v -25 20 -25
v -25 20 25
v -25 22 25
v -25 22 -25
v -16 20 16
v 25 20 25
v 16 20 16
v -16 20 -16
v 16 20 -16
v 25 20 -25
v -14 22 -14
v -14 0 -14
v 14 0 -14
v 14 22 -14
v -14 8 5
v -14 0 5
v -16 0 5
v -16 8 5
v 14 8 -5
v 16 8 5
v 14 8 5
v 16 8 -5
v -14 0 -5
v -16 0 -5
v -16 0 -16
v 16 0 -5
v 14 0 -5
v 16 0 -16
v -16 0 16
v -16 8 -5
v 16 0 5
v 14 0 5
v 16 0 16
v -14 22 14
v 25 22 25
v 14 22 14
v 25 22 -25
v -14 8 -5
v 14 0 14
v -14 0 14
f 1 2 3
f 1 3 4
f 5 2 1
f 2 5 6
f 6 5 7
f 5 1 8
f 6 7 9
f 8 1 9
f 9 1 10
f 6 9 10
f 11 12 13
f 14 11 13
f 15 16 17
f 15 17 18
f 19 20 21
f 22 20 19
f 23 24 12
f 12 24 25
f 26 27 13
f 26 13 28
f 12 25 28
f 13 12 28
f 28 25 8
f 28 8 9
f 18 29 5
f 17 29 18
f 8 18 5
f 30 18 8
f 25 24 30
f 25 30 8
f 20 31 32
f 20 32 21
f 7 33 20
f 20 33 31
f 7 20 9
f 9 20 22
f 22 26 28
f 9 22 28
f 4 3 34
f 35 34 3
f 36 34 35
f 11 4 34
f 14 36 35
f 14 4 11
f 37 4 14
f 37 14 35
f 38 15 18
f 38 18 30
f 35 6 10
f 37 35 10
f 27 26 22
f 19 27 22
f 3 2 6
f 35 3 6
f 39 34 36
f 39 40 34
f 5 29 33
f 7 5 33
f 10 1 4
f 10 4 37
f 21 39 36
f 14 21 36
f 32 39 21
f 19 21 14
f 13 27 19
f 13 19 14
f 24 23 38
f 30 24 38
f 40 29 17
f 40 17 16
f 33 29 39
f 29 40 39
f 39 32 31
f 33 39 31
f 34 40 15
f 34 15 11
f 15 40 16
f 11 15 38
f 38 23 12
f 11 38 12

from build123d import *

# Parameters (mm, degrees)
SKETCH1_W           = 32
SKETCH1_H           = 32
SKETCH1_W_2         = 28
SKETCH1_H_2         = 28
BOSS_EXTRUDE1_DEPTH = 20
SKETCH2_W           = 10
SKETCH2_H           = 8
CUT_EXTRUDE1_DEPTH  = 33
SKETCH3_W           = 50
SKETCH3_H           = 50
SKETCH3_W_2         = 28
SKETCH3_H_2         = 28
BOSS_EXTRUDE2_DEPTH = 2


with BuildPart() as part:
    # Sketch1 → Boss-Extrude1 (new body)
    with BuildSketch(Plane(origin=(0, 0, 0), x_dir=(1, 0, 0), z_dir=(0, 1, 0))):
        Rectangle(SKETCH1_W, SKETCH1_H)
        Rectangle(SKETCH1_W_2, SKETCH1_H_2, mode=Mode.SUBTRACT)
    extrude(amount=BOSS_EXTRUDE1_DEPTH)

    # Sketch2 → Cut-Extrude1 (cut, through all)
    with BuildSketch(Plane(origin=(16, 0, 0), x_dir=(0, 0, -1), z_dir=(1, 0, 0))):
        with Locations((0, 4)):
            Rectangle(SKETCH2_W, SKETCH2_H)
    extrude(amount=-CUT_EXTRUDE1_DEPTH, mode=Mode.SUBTRACT)

    # Sketch3 → Boss-Extrude2 (add)
    with BuildSketch(Plane(origin=(0, 20, 0), x_dir=(1, 0, 0), z_dir=(0, 1, 0))):
        Rectangle(SKETCH3_W, SKETCH3_H)
        Rectangle(SKETCH3_W_2, SKETCH3_H_2, mode=Mode.SUBTRACT)
    extrude(amount=BOSS_EXTRUDE2_DEPTH)


solid = part.part
